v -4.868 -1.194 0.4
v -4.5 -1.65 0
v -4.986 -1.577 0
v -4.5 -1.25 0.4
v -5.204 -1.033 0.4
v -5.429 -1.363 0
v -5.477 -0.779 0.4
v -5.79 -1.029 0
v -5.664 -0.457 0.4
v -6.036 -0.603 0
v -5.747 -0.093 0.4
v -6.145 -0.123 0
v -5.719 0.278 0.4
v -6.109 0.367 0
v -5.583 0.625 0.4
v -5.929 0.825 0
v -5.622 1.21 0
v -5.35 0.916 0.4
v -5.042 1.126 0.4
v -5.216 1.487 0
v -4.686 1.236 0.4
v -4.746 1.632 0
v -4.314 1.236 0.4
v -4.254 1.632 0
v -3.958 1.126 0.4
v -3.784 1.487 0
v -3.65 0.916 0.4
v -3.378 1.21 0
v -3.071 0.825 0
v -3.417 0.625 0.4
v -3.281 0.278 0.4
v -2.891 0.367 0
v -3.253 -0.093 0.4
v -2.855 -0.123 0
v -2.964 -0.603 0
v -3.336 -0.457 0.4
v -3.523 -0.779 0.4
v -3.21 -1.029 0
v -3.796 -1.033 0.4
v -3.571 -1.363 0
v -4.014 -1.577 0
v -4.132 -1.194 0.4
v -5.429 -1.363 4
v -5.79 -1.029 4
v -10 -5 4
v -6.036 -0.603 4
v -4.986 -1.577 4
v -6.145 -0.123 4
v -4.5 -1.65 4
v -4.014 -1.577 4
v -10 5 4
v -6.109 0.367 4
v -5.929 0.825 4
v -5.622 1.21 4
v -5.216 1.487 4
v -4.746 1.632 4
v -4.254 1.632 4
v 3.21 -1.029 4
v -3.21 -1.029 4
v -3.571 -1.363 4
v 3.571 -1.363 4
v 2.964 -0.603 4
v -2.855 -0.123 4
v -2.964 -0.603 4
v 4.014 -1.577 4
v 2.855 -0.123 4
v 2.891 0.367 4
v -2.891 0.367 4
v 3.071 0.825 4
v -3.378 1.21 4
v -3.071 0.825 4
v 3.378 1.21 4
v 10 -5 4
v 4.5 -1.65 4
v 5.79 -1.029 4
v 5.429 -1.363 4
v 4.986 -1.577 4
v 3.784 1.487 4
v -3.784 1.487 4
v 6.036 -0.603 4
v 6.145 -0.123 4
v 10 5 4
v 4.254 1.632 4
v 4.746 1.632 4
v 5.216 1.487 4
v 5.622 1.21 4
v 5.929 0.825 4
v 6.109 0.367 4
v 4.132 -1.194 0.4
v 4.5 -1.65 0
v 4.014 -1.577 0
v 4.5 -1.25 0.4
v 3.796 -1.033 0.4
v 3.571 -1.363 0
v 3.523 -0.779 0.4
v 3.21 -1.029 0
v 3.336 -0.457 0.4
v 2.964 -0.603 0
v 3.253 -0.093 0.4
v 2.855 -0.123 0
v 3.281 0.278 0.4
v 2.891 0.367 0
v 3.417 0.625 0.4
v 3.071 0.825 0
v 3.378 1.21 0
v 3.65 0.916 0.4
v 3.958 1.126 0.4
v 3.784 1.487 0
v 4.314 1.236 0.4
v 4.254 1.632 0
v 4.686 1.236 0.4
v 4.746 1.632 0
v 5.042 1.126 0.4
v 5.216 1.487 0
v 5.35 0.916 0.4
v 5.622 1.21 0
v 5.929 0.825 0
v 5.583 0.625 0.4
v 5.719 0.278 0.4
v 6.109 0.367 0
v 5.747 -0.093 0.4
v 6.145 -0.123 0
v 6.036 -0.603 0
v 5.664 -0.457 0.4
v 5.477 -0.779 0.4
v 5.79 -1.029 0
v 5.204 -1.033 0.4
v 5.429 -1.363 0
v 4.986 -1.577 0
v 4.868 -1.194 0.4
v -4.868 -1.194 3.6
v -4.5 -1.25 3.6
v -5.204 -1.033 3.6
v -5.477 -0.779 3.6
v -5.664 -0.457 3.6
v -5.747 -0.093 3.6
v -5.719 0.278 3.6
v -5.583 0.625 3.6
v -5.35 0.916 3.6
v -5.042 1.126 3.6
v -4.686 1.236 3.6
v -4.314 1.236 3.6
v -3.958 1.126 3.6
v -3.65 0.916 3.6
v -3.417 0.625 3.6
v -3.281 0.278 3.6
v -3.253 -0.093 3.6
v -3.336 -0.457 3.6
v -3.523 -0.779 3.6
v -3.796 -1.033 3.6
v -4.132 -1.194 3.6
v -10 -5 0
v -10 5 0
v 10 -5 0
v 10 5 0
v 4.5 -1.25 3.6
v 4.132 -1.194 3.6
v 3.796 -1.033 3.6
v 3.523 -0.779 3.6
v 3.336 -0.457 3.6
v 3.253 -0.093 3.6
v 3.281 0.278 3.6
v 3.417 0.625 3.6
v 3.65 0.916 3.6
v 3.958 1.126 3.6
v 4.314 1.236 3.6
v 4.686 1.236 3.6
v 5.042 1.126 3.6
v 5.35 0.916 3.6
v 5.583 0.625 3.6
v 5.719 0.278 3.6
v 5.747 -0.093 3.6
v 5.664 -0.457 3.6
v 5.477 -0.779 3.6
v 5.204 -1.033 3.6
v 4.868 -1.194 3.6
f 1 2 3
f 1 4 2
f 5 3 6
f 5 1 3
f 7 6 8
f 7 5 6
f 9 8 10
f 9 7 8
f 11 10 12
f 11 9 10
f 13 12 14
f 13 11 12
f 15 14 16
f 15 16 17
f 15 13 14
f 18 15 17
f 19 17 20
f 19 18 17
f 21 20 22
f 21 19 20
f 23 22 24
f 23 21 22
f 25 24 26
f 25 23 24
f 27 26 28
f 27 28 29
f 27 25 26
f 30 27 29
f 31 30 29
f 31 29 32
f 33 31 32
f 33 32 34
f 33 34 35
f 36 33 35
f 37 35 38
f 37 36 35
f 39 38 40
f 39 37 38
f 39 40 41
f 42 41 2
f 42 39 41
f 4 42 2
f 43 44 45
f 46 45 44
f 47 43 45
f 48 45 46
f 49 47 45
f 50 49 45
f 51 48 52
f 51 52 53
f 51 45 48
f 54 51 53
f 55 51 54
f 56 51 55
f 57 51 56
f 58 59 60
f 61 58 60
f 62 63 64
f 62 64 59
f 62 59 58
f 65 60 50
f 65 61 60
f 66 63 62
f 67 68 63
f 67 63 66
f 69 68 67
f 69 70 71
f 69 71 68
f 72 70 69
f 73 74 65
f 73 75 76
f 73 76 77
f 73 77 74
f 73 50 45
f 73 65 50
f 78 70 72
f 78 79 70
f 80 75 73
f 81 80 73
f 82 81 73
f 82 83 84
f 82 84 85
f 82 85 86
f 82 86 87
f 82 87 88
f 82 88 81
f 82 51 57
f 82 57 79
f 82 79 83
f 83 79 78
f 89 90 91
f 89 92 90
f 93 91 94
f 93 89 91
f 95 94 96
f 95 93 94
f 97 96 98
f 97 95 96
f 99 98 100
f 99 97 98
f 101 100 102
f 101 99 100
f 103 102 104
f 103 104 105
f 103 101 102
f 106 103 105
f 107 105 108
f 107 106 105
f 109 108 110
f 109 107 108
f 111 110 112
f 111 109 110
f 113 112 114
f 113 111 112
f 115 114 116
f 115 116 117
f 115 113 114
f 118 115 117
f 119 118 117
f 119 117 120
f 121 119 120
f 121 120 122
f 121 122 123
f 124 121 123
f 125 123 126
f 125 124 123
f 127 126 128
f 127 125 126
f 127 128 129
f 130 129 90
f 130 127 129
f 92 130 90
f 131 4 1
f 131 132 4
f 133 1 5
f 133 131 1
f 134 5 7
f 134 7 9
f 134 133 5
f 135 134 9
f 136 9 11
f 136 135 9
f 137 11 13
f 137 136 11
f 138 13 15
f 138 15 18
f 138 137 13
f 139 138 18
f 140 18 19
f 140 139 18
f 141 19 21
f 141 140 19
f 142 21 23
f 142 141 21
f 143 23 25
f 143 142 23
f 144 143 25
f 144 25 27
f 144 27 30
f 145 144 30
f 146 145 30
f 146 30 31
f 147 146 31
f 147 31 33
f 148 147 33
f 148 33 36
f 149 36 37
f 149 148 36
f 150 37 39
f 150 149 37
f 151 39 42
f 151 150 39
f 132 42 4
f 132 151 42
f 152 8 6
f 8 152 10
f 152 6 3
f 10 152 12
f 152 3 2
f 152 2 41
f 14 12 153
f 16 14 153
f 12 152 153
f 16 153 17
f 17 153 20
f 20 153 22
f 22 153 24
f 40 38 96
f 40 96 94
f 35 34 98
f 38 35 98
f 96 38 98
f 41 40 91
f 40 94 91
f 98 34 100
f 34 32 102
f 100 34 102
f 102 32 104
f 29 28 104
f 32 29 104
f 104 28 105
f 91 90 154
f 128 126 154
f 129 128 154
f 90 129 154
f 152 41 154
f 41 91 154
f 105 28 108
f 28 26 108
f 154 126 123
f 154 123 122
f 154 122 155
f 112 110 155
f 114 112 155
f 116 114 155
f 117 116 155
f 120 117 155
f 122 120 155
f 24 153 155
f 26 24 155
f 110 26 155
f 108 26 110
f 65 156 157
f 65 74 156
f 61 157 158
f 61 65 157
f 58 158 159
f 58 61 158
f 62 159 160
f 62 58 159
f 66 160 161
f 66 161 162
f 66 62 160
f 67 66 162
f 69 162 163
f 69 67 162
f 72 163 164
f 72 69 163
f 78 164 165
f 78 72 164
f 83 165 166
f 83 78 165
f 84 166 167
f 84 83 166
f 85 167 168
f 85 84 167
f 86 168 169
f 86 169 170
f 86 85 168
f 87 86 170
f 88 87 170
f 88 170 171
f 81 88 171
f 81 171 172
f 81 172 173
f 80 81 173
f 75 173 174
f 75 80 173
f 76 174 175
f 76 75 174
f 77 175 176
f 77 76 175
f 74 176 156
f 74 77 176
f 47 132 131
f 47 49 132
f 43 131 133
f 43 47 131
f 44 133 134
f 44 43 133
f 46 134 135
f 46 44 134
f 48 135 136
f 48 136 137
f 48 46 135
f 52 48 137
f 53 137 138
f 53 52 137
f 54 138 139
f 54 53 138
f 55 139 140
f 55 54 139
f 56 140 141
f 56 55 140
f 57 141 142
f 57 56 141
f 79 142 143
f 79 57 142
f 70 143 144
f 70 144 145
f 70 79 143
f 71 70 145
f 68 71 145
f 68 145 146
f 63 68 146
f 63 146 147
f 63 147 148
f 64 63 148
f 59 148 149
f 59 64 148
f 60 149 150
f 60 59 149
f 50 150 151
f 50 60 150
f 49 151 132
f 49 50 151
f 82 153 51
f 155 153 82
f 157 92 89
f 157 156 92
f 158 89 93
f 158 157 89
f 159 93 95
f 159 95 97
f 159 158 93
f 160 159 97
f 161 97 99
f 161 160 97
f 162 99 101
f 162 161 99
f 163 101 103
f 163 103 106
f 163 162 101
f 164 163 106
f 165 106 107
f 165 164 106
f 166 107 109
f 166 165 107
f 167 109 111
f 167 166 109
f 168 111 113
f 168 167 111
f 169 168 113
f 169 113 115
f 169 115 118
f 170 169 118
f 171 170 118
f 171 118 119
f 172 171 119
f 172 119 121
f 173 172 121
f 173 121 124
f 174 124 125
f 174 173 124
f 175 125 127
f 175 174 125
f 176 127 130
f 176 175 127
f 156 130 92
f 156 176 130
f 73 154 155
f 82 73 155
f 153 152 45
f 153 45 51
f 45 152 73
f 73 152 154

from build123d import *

# Parameters (mm, degrees)
SKETCH_1_W         = 20
SKETCH_1_H         = 10
EXTRUDE_1_DEPTH    = 4
M3X0_51_AT_2_COUNT = 2
M3X0_51_AT_2_PITCH = 9


with BuildPart() as part:
    # Эскиз1 → Бобышка-Вытянуть1 (new body)
    with BuildSketch(Plane.XY):
        Rectangle(SKETCH_1_W, SKETCH_1_H)
    extrude(amount=EXTRUDE_1_DEPTH)

    # Эскиз2 → Отверстие обработанное метчиком M3x0.51 (revolve, cut)
    with BuildSketch(Plane(origin=(-4.5, 0, 4), x_dir=(0, -1, 0), z_dir=(1, 0, 0))):
        Polygon((0, 0), (0, 4), (1.65, 4), (1.25, 3.6), (1.25, 0.4), (1.65, 0), align=None)
    m3x0_51 = revolve(axis=Axis((-4.5, 0, 10.35), (0, 0, -1)), mode=Mode.SUBTRACT)

    # Отверстие обработанное метчиком M3x0.51 at 2: Отверстие обработанное метчиком M3x0.51 ×2
    with Locations(*[(i * M3X0_51_AT_2_PITCH, 0, 0) for i in range(1, M3X0_51_AT_2_COUNT)]):
        add(m3x0_51, mode=Mode.SUBTRACT)


solid = part.part
